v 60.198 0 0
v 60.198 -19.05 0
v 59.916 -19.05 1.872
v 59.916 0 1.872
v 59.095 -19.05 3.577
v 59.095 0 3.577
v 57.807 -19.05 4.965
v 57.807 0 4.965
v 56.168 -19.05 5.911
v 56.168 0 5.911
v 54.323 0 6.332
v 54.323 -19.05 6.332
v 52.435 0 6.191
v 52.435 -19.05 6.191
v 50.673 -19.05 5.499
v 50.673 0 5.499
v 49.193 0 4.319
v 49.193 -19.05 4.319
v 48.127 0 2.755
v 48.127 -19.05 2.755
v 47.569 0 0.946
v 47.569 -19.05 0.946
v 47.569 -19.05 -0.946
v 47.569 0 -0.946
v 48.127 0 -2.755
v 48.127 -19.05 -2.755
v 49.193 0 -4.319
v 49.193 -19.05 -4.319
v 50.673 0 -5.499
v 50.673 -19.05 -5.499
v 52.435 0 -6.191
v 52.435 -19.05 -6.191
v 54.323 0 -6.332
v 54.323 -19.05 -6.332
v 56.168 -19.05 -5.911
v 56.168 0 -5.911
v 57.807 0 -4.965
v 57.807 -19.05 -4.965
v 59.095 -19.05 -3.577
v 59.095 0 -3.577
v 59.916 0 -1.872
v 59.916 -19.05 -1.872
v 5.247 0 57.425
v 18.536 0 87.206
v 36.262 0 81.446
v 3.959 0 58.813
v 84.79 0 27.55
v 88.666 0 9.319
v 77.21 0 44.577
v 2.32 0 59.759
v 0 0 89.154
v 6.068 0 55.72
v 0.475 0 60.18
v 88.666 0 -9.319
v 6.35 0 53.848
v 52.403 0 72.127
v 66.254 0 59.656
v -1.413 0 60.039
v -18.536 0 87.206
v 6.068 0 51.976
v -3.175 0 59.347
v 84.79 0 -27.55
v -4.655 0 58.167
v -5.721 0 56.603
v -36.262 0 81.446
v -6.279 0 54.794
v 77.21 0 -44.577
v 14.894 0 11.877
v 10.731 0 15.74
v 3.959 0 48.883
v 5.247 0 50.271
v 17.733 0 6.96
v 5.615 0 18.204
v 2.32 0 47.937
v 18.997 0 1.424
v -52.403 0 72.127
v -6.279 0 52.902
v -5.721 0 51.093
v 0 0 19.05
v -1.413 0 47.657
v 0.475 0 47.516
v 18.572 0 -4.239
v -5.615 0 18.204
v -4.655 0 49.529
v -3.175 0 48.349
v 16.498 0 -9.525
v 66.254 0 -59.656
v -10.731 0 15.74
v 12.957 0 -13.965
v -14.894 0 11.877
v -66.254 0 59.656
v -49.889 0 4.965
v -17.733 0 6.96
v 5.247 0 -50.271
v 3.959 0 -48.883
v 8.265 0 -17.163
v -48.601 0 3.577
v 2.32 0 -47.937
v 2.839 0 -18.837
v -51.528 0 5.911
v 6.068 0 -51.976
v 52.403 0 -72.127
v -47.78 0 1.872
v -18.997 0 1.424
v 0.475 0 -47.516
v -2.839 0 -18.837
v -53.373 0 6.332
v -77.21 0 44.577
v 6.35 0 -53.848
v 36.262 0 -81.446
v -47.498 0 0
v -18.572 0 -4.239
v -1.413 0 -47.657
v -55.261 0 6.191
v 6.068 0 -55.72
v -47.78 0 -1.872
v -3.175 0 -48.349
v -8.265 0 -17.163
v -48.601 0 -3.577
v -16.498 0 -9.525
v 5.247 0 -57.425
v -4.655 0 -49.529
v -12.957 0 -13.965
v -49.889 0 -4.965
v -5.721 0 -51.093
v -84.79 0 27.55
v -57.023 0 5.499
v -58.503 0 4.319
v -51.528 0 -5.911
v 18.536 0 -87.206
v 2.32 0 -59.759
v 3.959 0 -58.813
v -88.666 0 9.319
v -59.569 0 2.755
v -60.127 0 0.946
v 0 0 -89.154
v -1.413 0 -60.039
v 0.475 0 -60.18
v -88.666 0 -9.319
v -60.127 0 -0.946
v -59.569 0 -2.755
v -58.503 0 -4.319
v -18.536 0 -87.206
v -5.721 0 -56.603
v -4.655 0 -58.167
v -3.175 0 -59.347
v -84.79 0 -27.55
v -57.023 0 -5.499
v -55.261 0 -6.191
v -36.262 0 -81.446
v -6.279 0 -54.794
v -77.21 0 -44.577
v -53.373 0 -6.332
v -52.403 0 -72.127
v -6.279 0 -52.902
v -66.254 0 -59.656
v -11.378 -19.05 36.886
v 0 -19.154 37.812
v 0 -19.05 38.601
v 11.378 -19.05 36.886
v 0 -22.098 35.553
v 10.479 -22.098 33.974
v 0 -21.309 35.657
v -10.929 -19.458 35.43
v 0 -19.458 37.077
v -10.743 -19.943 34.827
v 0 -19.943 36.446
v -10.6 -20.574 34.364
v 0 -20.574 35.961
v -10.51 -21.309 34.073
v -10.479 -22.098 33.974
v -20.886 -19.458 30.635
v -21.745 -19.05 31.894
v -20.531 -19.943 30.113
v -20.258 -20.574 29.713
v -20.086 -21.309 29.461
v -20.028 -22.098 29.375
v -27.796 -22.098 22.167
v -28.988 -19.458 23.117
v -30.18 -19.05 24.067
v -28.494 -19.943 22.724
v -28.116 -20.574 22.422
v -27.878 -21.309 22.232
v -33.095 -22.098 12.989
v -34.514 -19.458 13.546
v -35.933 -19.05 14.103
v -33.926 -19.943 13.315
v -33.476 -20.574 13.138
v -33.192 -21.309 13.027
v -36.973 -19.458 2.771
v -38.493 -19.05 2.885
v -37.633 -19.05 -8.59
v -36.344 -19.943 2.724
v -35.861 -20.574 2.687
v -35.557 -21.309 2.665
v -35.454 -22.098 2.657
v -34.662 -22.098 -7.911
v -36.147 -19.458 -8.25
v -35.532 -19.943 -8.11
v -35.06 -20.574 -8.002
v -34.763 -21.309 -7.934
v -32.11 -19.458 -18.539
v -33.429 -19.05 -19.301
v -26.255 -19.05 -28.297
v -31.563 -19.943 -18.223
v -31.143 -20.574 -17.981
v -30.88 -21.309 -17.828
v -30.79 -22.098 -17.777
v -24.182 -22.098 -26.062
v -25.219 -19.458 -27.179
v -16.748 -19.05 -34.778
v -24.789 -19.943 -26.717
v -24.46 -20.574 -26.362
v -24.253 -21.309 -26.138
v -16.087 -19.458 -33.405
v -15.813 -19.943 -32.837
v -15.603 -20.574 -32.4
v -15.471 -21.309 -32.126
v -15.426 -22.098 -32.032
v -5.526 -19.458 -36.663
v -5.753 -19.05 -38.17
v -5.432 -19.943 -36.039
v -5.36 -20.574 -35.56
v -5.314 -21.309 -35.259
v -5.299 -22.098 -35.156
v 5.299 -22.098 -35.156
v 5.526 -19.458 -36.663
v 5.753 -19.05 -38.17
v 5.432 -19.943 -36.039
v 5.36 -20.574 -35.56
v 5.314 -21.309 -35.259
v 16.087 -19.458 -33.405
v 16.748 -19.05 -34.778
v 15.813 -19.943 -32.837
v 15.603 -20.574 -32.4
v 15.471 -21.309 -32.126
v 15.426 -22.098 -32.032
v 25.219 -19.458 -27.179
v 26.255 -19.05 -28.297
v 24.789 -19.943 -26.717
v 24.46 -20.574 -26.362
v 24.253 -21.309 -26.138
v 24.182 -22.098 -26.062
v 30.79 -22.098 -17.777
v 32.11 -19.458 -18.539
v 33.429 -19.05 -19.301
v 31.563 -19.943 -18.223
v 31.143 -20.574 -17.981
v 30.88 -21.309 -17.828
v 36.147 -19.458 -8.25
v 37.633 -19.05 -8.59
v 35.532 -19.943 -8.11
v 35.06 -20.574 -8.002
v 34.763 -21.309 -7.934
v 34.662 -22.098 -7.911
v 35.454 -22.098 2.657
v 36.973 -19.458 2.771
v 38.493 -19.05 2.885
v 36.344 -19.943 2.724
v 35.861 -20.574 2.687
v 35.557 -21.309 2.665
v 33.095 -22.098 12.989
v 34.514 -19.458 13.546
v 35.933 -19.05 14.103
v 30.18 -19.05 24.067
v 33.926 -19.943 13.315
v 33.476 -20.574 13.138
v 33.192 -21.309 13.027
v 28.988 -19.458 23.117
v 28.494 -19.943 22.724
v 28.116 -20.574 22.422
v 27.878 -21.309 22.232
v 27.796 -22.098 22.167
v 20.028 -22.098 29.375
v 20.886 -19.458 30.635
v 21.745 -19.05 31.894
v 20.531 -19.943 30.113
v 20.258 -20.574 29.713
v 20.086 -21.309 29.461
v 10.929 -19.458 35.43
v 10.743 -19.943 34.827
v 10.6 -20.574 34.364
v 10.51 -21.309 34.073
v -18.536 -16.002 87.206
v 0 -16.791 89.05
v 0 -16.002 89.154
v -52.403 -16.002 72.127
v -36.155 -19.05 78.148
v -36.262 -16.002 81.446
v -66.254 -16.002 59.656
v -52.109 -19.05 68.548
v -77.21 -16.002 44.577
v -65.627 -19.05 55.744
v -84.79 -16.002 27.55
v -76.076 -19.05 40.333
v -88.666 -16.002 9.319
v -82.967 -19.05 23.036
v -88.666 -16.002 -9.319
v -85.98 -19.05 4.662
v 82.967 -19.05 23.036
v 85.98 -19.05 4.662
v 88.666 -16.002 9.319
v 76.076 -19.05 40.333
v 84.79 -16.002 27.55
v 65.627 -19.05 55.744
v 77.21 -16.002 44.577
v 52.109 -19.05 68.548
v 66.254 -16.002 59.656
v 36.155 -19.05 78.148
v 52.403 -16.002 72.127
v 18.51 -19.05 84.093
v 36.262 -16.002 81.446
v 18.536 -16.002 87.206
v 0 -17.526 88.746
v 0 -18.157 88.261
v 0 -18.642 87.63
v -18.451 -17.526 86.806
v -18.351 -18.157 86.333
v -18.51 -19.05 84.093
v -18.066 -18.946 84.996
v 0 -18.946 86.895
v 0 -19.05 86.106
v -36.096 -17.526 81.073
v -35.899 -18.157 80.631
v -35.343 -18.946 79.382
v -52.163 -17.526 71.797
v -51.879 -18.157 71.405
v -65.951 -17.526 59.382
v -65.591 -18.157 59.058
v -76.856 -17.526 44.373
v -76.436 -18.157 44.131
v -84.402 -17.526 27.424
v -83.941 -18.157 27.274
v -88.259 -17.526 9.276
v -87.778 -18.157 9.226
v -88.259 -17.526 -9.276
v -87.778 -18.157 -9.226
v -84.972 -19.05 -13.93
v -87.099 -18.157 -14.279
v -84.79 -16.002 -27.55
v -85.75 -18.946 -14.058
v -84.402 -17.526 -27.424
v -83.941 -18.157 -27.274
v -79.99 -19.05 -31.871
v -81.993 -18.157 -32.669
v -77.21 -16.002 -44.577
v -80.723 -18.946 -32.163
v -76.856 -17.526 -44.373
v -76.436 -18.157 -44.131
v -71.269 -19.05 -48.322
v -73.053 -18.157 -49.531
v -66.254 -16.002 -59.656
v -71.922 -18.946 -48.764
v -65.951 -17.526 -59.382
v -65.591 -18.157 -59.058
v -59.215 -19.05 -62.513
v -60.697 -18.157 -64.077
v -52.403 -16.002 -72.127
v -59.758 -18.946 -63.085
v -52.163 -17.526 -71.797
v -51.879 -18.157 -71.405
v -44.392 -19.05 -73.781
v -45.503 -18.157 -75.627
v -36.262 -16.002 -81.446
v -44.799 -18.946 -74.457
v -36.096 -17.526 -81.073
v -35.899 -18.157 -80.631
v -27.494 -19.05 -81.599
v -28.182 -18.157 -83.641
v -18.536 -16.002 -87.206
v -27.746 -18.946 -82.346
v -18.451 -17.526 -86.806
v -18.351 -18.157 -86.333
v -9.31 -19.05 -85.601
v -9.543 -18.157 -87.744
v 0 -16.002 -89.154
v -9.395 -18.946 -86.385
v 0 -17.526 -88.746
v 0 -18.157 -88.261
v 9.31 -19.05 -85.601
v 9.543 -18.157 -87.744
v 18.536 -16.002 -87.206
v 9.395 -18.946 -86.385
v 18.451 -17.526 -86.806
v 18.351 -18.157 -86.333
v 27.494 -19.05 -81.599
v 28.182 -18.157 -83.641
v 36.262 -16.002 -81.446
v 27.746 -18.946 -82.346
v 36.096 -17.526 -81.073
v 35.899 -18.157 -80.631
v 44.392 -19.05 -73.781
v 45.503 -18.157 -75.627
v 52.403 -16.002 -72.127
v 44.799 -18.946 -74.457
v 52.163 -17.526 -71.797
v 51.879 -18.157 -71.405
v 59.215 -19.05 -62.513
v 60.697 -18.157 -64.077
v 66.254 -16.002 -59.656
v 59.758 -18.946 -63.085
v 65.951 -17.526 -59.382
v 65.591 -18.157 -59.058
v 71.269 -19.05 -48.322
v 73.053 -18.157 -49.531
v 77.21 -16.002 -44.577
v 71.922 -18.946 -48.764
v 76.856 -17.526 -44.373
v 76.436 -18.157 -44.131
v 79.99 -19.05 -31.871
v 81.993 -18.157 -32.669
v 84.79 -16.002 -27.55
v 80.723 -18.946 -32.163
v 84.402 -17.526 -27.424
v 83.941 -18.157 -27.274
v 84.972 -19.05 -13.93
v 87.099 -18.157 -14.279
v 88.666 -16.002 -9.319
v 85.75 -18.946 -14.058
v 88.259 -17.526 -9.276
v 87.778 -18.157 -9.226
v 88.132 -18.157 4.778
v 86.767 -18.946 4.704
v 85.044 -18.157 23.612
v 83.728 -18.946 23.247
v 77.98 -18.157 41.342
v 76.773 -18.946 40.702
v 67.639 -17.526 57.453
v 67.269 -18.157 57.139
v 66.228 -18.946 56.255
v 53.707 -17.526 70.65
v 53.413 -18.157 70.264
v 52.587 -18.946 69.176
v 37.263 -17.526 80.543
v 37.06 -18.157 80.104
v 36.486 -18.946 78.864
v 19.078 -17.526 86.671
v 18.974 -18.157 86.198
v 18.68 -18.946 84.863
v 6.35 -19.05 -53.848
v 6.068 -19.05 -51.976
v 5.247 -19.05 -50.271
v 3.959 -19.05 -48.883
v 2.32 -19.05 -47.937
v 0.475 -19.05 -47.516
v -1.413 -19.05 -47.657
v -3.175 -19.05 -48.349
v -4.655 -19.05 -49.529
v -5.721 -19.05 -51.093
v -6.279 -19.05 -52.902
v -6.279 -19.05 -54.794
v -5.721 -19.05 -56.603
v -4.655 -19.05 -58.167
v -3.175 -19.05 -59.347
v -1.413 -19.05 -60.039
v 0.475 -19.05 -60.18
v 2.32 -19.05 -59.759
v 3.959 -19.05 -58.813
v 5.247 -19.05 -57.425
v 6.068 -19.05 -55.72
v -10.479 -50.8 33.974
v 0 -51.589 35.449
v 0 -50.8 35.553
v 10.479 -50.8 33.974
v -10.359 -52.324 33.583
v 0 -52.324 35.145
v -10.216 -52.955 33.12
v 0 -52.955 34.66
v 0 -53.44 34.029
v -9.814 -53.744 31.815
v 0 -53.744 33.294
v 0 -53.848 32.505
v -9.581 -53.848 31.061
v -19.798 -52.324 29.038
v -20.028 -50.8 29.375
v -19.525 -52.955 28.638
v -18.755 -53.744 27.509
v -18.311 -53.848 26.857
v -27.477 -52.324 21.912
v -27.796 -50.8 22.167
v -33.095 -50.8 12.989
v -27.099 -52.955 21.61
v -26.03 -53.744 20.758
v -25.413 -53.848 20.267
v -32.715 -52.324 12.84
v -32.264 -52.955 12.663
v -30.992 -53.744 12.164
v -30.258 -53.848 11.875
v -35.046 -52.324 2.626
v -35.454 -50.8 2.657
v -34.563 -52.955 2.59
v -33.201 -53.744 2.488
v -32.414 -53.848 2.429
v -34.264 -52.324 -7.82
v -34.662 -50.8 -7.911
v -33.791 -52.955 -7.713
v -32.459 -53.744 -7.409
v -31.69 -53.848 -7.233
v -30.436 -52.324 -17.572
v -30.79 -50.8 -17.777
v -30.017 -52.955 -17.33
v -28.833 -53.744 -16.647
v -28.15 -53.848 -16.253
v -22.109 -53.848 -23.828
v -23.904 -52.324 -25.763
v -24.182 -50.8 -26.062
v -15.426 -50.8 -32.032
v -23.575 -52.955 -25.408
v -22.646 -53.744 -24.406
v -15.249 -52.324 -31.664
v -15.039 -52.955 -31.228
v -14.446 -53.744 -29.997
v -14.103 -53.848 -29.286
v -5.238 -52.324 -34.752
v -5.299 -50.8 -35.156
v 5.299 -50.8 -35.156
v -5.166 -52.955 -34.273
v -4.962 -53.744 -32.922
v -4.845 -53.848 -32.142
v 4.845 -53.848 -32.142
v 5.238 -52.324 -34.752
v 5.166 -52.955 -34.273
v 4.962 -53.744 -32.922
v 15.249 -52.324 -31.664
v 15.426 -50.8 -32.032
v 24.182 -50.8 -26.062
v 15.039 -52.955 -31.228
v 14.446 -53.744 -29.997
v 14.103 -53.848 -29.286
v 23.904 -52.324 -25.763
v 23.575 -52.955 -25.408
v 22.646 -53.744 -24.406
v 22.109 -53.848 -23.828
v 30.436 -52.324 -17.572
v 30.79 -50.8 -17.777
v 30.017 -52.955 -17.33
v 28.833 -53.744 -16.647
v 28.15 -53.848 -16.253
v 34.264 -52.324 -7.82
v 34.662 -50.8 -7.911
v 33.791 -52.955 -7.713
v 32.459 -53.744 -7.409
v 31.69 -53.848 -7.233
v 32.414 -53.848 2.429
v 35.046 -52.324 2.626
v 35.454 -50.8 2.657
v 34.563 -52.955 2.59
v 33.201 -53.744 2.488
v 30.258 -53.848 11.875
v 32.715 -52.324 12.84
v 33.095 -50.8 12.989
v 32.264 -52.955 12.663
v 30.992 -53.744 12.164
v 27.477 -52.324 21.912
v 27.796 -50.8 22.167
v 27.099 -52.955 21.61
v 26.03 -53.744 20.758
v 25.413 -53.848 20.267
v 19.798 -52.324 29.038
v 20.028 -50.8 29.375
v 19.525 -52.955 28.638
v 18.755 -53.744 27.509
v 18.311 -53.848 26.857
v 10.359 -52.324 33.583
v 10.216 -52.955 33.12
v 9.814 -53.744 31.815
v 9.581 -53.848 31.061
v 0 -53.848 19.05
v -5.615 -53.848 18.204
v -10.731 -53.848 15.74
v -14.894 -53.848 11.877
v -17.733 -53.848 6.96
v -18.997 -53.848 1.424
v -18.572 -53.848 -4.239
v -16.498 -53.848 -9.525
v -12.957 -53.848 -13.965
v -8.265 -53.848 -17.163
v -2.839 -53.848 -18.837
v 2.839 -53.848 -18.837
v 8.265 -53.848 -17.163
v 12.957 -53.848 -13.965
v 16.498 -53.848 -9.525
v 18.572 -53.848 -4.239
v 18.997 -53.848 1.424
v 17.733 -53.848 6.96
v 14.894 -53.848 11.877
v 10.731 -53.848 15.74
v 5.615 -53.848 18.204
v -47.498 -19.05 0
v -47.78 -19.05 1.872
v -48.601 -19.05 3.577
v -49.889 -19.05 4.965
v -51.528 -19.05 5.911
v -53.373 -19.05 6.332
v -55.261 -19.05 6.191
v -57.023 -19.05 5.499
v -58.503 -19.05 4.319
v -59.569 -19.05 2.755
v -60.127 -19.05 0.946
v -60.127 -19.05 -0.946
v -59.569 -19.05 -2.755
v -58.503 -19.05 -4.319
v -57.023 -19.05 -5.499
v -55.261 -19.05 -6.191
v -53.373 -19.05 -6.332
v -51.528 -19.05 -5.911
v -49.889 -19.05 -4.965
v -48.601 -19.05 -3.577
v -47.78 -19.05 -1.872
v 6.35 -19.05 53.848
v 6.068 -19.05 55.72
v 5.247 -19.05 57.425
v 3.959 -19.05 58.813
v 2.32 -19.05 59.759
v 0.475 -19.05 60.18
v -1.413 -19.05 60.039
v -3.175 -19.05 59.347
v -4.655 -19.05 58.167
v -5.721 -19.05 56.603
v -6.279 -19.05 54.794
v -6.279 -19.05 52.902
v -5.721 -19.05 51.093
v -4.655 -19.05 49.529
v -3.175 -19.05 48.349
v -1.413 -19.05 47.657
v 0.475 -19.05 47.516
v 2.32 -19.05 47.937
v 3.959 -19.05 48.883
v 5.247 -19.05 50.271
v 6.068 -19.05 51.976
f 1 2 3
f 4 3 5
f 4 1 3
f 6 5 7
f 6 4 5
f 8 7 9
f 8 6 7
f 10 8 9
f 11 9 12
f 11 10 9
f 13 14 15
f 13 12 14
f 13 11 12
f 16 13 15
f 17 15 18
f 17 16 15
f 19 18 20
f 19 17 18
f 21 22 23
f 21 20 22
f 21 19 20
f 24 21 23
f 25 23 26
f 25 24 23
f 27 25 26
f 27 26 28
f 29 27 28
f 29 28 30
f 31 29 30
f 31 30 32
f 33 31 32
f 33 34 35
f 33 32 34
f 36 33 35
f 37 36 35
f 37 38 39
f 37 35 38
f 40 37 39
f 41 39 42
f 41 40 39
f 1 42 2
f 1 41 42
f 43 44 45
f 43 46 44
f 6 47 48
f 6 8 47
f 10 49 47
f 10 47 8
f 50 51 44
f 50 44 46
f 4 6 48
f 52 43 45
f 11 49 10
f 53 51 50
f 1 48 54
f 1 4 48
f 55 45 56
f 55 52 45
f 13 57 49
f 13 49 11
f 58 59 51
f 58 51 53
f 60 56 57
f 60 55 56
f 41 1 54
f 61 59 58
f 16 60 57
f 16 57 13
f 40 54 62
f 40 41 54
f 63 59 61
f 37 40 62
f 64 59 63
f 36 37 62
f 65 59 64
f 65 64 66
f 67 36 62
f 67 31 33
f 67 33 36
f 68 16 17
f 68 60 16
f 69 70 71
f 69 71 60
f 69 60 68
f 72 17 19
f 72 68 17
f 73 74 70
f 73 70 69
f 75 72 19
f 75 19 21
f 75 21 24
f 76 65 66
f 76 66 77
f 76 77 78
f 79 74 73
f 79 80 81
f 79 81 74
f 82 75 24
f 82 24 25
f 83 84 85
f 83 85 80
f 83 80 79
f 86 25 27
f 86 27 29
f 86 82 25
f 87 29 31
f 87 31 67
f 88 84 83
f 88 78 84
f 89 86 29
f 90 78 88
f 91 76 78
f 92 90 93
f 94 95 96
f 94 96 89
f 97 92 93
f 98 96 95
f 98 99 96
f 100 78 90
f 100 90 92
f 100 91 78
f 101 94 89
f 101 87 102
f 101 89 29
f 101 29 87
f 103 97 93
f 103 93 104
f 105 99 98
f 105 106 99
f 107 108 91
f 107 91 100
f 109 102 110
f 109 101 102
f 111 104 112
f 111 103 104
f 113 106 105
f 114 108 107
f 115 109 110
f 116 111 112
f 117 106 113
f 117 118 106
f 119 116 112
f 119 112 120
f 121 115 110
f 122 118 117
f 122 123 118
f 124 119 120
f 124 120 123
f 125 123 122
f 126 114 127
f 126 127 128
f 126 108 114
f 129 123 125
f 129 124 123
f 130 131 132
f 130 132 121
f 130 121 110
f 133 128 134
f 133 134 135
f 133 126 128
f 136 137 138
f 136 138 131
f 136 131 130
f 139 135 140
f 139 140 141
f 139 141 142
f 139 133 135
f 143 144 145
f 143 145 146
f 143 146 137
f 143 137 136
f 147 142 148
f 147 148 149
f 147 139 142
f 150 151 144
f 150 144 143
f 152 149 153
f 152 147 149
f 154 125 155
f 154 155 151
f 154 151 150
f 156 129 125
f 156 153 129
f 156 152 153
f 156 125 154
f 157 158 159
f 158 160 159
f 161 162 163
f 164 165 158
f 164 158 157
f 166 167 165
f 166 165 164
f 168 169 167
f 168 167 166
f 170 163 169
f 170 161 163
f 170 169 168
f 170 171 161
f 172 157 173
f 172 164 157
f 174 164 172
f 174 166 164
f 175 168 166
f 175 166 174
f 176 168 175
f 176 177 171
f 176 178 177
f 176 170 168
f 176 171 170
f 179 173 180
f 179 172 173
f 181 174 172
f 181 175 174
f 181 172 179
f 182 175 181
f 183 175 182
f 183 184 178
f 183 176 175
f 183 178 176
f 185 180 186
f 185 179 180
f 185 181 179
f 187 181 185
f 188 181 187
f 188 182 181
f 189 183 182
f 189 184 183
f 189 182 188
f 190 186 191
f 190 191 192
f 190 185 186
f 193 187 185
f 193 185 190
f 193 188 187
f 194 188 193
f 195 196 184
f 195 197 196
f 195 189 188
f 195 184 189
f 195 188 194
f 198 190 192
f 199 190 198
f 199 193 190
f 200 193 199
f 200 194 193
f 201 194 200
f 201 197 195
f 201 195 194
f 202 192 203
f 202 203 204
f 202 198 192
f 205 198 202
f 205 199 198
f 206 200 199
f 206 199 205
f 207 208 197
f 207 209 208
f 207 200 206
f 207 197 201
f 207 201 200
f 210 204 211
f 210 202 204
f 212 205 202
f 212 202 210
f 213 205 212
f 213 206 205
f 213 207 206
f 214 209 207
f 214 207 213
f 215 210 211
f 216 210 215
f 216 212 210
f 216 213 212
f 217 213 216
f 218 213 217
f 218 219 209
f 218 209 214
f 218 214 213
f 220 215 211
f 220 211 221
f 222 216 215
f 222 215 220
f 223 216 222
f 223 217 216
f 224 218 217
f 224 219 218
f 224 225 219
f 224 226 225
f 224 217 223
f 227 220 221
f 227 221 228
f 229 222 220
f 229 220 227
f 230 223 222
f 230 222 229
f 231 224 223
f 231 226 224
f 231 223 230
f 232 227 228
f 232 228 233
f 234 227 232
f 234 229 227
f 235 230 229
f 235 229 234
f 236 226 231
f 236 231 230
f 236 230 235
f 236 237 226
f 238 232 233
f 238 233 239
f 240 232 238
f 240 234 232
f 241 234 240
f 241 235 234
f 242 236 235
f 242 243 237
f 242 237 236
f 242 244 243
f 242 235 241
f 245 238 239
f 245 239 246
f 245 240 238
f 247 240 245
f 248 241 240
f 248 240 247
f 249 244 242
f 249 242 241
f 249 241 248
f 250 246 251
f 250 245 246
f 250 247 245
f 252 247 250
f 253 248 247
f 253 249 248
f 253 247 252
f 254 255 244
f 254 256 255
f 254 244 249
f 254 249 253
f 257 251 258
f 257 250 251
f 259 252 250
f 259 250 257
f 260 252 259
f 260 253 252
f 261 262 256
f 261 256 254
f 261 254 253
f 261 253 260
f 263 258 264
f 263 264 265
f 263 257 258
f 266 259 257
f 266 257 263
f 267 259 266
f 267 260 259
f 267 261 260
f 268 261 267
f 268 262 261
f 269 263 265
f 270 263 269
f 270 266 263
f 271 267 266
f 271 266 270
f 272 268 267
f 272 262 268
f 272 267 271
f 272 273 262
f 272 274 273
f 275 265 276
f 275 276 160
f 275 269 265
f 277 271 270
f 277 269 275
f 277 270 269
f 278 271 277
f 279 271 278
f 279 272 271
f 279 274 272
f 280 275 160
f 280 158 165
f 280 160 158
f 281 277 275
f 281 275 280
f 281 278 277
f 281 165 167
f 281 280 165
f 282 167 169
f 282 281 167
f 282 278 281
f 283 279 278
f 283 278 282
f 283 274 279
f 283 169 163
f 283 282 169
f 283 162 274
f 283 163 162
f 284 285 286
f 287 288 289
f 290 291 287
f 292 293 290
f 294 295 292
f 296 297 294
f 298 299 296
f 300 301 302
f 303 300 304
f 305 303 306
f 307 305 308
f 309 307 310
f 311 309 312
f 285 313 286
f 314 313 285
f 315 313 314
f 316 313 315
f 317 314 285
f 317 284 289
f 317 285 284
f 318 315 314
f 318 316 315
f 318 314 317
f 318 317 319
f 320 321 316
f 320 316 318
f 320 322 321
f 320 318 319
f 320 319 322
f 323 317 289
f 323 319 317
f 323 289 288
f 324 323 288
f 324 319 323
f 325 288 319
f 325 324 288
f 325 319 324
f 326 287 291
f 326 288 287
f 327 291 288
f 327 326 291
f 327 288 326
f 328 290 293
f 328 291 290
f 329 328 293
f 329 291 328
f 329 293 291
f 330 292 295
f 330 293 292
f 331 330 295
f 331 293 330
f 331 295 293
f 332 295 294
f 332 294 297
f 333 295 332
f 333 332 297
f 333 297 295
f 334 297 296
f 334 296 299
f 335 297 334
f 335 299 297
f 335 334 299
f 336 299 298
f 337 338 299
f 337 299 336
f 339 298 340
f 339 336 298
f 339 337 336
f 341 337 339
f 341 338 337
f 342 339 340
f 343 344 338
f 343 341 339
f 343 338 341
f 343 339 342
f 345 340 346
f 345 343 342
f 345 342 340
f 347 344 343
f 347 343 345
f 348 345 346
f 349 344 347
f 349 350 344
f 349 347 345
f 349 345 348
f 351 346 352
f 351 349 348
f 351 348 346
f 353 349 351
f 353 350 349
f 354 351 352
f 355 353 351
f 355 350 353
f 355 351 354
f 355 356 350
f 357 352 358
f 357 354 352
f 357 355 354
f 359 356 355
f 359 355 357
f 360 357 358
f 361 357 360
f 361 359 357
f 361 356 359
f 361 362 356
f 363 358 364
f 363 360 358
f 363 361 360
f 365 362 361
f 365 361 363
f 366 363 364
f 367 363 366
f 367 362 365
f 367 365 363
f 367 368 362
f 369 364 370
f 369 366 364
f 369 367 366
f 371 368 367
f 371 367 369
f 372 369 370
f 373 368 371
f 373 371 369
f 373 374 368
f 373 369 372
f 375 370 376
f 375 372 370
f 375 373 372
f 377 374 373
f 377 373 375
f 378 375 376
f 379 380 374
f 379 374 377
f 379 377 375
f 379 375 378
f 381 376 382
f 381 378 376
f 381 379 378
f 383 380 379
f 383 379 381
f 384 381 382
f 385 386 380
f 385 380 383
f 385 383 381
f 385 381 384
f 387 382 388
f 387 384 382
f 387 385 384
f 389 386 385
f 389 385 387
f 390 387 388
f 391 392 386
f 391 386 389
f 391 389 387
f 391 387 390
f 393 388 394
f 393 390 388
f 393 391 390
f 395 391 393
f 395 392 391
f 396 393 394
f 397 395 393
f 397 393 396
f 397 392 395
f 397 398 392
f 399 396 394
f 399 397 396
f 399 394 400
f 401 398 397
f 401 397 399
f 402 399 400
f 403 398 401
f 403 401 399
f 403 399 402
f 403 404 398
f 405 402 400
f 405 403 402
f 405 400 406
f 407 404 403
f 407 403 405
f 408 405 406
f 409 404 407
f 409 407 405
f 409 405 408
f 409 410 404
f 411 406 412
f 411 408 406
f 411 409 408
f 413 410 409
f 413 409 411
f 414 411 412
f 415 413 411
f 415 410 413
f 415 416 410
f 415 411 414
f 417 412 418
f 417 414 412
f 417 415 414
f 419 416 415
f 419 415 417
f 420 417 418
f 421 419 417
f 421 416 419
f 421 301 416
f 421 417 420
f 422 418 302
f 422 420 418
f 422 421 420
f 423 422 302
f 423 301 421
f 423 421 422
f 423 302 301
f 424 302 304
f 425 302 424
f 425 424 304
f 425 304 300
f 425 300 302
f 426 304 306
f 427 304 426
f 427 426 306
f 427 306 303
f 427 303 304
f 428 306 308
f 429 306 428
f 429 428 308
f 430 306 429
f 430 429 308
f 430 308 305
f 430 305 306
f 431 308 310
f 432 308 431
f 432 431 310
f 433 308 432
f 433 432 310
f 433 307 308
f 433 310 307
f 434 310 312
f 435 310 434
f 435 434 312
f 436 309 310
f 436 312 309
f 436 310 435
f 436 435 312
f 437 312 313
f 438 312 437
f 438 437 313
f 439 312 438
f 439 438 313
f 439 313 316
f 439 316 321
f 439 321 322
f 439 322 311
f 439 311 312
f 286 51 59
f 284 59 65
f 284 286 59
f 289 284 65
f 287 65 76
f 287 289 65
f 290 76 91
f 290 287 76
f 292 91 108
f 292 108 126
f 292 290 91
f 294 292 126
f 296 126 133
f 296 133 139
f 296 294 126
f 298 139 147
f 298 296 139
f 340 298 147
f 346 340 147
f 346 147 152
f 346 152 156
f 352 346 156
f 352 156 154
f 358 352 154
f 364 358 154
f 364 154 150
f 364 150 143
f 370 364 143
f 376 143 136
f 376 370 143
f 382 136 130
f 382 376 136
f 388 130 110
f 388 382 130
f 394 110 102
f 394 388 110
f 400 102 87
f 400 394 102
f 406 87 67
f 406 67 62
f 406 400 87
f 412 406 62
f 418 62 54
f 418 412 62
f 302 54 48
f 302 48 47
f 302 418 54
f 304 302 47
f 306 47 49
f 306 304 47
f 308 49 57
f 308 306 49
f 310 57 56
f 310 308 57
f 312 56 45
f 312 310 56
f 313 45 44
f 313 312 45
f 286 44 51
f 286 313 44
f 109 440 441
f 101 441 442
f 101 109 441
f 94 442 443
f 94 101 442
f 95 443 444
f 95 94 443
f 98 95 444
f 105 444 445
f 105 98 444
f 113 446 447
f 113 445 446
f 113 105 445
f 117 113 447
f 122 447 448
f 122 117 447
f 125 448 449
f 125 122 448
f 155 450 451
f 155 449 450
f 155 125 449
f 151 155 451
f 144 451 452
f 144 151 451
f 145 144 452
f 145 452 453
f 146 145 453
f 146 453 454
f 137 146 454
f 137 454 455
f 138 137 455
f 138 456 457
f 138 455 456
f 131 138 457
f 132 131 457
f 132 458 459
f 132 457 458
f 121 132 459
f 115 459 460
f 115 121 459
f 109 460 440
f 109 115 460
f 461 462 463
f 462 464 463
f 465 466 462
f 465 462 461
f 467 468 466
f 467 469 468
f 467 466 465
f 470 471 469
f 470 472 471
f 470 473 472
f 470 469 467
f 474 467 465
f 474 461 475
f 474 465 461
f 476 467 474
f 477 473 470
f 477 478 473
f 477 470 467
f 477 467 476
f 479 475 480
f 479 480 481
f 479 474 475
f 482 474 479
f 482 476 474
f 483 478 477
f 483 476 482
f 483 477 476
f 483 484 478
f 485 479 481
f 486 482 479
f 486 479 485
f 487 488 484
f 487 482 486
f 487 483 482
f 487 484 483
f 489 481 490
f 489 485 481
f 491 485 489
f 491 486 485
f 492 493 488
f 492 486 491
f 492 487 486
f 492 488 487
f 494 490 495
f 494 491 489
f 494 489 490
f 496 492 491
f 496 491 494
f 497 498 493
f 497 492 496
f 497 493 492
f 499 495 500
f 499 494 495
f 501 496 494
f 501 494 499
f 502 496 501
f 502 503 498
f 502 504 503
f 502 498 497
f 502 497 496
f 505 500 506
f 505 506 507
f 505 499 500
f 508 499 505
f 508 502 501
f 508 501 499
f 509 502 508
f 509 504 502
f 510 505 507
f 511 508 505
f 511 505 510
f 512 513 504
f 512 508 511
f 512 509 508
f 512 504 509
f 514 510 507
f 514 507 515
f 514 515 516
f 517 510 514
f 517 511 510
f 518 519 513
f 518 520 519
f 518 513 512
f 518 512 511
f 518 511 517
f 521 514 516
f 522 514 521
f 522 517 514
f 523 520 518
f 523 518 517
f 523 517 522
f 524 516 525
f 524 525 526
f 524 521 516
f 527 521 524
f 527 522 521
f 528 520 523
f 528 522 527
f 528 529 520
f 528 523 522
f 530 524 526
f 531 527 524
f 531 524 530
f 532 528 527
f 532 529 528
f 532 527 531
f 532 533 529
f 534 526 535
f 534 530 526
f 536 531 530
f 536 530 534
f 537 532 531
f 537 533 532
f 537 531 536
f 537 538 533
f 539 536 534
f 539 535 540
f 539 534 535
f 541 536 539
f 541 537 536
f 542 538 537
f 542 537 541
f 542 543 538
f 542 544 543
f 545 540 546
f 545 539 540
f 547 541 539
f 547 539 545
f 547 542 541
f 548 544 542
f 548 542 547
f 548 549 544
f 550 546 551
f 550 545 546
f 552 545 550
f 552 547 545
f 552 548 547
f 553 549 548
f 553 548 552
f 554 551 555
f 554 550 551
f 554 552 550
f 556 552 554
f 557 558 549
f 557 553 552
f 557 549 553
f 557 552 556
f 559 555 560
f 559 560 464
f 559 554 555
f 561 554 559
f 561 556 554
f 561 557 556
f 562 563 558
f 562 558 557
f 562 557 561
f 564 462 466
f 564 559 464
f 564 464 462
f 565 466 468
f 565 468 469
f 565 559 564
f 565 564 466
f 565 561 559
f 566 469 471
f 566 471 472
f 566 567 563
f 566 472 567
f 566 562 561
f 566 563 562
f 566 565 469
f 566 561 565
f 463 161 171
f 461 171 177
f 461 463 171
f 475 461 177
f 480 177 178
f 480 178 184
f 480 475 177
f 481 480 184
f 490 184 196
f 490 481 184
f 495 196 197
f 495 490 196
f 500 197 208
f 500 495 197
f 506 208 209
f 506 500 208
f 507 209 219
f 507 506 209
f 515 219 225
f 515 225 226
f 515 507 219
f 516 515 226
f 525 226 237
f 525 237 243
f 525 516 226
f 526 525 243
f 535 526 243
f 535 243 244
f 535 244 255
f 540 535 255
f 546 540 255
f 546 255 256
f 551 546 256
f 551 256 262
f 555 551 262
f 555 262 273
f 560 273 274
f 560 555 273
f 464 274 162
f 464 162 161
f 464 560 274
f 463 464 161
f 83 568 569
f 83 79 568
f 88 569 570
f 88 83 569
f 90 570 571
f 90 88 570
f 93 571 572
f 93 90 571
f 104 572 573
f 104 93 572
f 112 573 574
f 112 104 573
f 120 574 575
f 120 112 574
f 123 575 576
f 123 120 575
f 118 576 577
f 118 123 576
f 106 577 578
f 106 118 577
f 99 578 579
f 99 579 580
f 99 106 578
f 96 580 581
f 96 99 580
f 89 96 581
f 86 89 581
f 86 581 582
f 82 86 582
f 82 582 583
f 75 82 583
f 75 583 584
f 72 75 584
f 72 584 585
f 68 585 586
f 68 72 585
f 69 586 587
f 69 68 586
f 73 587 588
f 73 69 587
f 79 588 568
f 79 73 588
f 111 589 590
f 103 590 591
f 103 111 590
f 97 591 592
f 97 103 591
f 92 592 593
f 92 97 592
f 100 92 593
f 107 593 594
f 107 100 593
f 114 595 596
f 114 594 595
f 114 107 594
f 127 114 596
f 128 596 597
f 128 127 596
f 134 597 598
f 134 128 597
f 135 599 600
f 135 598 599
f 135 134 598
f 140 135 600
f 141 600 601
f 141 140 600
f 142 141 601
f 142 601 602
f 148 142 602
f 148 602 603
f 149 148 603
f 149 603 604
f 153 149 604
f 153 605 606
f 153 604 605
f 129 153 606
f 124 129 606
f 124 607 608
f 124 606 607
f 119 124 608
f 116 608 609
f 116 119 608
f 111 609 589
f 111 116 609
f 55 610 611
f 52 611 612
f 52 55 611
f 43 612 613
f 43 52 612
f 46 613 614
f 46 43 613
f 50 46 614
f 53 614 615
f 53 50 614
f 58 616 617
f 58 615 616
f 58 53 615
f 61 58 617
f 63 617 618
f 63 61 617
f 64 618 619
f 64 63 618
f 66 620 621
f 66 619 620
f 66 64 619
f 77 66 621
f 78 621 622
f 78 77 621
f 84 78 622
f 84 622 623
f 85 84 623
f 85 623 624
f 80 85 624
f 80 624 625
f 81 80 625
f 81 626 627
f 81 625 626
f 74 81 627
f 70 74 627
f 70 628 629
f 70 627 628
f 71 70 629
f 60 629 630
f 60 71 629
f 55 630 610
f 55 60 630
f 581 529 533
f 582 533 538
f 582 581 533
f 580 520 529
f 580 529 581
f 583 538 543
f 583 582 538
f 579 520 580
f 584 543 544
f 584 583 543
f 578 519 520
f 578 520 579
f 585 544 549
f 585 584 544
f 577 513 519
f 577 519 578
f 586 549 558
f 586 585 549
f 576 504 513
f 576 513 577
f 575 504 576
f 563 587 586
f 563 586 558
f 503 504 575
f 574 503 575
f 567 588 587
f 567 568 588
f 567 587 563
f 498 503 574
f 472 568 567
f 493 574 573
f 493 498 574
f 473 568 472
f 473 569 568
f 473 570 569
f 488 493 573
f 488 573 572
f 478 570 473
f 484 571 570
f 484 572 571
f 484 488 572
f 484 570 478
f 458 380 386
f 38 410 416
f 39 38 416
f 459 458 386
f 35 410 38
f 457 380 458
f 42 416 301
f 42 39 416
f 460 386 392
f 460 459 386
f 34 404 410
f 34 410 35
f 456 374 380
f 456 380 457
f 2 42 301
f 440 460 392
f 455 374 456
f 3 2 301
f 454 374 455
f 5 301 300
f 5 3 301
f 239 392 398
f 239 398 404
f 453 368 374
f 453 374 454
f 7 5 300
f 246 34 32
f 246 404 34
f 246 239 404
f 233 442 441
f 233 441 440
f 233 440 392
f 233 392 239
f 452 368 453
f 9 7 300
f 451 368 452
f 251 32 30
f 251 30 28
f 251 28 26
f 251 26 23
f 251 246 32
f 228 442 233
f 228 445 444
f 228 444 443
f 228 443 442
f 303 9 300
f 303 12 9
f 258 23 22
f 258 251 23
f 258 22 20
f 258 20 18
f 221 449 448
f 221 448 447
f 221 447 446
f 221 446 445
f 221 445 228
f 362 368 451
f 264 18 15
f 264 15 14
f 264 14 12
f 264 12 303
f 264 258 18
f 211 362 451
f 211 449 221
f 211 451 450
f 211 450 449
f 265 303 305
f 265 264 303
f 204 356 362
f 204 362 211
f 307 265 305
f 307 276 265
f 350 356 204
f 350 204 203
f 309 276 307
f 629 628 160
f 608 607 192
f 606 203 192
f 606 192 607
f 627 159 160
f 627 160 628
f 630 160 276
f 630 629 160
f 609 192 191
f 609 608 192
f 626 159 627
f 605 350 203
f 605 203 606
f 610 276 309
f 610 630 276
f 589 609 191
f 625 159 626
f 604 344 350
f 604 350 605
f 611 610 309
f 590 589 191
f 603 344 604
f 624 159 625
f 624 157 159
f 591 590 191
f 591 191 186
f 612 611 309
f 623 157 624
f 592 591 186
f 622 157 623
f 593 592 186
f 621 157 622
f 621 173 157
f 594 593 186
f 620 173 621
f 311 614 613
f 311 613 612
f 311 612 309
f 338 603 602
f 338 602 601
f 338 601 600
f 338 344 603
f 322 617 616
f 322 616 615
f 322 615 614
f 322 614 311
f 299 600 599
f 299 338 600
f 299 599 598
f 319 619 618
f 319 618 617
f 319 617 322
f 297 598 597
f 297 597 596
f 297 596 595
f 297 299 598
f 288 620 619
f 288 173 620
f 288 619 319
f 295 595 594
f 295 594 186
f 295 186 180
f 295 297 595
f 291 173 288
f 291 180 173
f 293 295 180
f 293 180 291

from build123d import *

# Parameters (mm, degrees)
F2_R     = 3.048
F3_R     = 6.35
F4_DEPTH = 53.849


with BuildPart() as f1:
    # F0 (on Right) → F1 (revolve)
    with BuildSketch(Plane.YZ):
        Polygon((-53.848, 19.05), (0, 19.05), (0, 89.154), (-19.05, 89.154), (-19.05, 35.553055), (-53.848, 35.553055), align=None)
    revolve(axis=Axis((0, -0.230861, 0), (0, -1, 0)))

    # F2
    f2_edges = [f1.edges().sort_by_distance(p)[0] for p in [
        (0, -19.05, -89.154),
        (0, -19.05, -35.553055),
        (0, -53.848, -35.553055),
    ]]
    fillet(f2_edges, radius=F2_R)

    # F3 (on Front) → F4 (cut, through all)
    with BuildSketch(Plane.XZ):
        with Locations((0, 53.848)):
            Circle(F3_R)
        with Locations((53.848, 0)):
            Circle(F3_R)
        with Locations((-53.848, 0)):
            Circle(F3_R)
        with Locations((0, -53.848)):
            Circle(F3_R)
    extrude(amount=F4_DEPTH, mode=Mode.SUBTRACT)


solid = f1.part
